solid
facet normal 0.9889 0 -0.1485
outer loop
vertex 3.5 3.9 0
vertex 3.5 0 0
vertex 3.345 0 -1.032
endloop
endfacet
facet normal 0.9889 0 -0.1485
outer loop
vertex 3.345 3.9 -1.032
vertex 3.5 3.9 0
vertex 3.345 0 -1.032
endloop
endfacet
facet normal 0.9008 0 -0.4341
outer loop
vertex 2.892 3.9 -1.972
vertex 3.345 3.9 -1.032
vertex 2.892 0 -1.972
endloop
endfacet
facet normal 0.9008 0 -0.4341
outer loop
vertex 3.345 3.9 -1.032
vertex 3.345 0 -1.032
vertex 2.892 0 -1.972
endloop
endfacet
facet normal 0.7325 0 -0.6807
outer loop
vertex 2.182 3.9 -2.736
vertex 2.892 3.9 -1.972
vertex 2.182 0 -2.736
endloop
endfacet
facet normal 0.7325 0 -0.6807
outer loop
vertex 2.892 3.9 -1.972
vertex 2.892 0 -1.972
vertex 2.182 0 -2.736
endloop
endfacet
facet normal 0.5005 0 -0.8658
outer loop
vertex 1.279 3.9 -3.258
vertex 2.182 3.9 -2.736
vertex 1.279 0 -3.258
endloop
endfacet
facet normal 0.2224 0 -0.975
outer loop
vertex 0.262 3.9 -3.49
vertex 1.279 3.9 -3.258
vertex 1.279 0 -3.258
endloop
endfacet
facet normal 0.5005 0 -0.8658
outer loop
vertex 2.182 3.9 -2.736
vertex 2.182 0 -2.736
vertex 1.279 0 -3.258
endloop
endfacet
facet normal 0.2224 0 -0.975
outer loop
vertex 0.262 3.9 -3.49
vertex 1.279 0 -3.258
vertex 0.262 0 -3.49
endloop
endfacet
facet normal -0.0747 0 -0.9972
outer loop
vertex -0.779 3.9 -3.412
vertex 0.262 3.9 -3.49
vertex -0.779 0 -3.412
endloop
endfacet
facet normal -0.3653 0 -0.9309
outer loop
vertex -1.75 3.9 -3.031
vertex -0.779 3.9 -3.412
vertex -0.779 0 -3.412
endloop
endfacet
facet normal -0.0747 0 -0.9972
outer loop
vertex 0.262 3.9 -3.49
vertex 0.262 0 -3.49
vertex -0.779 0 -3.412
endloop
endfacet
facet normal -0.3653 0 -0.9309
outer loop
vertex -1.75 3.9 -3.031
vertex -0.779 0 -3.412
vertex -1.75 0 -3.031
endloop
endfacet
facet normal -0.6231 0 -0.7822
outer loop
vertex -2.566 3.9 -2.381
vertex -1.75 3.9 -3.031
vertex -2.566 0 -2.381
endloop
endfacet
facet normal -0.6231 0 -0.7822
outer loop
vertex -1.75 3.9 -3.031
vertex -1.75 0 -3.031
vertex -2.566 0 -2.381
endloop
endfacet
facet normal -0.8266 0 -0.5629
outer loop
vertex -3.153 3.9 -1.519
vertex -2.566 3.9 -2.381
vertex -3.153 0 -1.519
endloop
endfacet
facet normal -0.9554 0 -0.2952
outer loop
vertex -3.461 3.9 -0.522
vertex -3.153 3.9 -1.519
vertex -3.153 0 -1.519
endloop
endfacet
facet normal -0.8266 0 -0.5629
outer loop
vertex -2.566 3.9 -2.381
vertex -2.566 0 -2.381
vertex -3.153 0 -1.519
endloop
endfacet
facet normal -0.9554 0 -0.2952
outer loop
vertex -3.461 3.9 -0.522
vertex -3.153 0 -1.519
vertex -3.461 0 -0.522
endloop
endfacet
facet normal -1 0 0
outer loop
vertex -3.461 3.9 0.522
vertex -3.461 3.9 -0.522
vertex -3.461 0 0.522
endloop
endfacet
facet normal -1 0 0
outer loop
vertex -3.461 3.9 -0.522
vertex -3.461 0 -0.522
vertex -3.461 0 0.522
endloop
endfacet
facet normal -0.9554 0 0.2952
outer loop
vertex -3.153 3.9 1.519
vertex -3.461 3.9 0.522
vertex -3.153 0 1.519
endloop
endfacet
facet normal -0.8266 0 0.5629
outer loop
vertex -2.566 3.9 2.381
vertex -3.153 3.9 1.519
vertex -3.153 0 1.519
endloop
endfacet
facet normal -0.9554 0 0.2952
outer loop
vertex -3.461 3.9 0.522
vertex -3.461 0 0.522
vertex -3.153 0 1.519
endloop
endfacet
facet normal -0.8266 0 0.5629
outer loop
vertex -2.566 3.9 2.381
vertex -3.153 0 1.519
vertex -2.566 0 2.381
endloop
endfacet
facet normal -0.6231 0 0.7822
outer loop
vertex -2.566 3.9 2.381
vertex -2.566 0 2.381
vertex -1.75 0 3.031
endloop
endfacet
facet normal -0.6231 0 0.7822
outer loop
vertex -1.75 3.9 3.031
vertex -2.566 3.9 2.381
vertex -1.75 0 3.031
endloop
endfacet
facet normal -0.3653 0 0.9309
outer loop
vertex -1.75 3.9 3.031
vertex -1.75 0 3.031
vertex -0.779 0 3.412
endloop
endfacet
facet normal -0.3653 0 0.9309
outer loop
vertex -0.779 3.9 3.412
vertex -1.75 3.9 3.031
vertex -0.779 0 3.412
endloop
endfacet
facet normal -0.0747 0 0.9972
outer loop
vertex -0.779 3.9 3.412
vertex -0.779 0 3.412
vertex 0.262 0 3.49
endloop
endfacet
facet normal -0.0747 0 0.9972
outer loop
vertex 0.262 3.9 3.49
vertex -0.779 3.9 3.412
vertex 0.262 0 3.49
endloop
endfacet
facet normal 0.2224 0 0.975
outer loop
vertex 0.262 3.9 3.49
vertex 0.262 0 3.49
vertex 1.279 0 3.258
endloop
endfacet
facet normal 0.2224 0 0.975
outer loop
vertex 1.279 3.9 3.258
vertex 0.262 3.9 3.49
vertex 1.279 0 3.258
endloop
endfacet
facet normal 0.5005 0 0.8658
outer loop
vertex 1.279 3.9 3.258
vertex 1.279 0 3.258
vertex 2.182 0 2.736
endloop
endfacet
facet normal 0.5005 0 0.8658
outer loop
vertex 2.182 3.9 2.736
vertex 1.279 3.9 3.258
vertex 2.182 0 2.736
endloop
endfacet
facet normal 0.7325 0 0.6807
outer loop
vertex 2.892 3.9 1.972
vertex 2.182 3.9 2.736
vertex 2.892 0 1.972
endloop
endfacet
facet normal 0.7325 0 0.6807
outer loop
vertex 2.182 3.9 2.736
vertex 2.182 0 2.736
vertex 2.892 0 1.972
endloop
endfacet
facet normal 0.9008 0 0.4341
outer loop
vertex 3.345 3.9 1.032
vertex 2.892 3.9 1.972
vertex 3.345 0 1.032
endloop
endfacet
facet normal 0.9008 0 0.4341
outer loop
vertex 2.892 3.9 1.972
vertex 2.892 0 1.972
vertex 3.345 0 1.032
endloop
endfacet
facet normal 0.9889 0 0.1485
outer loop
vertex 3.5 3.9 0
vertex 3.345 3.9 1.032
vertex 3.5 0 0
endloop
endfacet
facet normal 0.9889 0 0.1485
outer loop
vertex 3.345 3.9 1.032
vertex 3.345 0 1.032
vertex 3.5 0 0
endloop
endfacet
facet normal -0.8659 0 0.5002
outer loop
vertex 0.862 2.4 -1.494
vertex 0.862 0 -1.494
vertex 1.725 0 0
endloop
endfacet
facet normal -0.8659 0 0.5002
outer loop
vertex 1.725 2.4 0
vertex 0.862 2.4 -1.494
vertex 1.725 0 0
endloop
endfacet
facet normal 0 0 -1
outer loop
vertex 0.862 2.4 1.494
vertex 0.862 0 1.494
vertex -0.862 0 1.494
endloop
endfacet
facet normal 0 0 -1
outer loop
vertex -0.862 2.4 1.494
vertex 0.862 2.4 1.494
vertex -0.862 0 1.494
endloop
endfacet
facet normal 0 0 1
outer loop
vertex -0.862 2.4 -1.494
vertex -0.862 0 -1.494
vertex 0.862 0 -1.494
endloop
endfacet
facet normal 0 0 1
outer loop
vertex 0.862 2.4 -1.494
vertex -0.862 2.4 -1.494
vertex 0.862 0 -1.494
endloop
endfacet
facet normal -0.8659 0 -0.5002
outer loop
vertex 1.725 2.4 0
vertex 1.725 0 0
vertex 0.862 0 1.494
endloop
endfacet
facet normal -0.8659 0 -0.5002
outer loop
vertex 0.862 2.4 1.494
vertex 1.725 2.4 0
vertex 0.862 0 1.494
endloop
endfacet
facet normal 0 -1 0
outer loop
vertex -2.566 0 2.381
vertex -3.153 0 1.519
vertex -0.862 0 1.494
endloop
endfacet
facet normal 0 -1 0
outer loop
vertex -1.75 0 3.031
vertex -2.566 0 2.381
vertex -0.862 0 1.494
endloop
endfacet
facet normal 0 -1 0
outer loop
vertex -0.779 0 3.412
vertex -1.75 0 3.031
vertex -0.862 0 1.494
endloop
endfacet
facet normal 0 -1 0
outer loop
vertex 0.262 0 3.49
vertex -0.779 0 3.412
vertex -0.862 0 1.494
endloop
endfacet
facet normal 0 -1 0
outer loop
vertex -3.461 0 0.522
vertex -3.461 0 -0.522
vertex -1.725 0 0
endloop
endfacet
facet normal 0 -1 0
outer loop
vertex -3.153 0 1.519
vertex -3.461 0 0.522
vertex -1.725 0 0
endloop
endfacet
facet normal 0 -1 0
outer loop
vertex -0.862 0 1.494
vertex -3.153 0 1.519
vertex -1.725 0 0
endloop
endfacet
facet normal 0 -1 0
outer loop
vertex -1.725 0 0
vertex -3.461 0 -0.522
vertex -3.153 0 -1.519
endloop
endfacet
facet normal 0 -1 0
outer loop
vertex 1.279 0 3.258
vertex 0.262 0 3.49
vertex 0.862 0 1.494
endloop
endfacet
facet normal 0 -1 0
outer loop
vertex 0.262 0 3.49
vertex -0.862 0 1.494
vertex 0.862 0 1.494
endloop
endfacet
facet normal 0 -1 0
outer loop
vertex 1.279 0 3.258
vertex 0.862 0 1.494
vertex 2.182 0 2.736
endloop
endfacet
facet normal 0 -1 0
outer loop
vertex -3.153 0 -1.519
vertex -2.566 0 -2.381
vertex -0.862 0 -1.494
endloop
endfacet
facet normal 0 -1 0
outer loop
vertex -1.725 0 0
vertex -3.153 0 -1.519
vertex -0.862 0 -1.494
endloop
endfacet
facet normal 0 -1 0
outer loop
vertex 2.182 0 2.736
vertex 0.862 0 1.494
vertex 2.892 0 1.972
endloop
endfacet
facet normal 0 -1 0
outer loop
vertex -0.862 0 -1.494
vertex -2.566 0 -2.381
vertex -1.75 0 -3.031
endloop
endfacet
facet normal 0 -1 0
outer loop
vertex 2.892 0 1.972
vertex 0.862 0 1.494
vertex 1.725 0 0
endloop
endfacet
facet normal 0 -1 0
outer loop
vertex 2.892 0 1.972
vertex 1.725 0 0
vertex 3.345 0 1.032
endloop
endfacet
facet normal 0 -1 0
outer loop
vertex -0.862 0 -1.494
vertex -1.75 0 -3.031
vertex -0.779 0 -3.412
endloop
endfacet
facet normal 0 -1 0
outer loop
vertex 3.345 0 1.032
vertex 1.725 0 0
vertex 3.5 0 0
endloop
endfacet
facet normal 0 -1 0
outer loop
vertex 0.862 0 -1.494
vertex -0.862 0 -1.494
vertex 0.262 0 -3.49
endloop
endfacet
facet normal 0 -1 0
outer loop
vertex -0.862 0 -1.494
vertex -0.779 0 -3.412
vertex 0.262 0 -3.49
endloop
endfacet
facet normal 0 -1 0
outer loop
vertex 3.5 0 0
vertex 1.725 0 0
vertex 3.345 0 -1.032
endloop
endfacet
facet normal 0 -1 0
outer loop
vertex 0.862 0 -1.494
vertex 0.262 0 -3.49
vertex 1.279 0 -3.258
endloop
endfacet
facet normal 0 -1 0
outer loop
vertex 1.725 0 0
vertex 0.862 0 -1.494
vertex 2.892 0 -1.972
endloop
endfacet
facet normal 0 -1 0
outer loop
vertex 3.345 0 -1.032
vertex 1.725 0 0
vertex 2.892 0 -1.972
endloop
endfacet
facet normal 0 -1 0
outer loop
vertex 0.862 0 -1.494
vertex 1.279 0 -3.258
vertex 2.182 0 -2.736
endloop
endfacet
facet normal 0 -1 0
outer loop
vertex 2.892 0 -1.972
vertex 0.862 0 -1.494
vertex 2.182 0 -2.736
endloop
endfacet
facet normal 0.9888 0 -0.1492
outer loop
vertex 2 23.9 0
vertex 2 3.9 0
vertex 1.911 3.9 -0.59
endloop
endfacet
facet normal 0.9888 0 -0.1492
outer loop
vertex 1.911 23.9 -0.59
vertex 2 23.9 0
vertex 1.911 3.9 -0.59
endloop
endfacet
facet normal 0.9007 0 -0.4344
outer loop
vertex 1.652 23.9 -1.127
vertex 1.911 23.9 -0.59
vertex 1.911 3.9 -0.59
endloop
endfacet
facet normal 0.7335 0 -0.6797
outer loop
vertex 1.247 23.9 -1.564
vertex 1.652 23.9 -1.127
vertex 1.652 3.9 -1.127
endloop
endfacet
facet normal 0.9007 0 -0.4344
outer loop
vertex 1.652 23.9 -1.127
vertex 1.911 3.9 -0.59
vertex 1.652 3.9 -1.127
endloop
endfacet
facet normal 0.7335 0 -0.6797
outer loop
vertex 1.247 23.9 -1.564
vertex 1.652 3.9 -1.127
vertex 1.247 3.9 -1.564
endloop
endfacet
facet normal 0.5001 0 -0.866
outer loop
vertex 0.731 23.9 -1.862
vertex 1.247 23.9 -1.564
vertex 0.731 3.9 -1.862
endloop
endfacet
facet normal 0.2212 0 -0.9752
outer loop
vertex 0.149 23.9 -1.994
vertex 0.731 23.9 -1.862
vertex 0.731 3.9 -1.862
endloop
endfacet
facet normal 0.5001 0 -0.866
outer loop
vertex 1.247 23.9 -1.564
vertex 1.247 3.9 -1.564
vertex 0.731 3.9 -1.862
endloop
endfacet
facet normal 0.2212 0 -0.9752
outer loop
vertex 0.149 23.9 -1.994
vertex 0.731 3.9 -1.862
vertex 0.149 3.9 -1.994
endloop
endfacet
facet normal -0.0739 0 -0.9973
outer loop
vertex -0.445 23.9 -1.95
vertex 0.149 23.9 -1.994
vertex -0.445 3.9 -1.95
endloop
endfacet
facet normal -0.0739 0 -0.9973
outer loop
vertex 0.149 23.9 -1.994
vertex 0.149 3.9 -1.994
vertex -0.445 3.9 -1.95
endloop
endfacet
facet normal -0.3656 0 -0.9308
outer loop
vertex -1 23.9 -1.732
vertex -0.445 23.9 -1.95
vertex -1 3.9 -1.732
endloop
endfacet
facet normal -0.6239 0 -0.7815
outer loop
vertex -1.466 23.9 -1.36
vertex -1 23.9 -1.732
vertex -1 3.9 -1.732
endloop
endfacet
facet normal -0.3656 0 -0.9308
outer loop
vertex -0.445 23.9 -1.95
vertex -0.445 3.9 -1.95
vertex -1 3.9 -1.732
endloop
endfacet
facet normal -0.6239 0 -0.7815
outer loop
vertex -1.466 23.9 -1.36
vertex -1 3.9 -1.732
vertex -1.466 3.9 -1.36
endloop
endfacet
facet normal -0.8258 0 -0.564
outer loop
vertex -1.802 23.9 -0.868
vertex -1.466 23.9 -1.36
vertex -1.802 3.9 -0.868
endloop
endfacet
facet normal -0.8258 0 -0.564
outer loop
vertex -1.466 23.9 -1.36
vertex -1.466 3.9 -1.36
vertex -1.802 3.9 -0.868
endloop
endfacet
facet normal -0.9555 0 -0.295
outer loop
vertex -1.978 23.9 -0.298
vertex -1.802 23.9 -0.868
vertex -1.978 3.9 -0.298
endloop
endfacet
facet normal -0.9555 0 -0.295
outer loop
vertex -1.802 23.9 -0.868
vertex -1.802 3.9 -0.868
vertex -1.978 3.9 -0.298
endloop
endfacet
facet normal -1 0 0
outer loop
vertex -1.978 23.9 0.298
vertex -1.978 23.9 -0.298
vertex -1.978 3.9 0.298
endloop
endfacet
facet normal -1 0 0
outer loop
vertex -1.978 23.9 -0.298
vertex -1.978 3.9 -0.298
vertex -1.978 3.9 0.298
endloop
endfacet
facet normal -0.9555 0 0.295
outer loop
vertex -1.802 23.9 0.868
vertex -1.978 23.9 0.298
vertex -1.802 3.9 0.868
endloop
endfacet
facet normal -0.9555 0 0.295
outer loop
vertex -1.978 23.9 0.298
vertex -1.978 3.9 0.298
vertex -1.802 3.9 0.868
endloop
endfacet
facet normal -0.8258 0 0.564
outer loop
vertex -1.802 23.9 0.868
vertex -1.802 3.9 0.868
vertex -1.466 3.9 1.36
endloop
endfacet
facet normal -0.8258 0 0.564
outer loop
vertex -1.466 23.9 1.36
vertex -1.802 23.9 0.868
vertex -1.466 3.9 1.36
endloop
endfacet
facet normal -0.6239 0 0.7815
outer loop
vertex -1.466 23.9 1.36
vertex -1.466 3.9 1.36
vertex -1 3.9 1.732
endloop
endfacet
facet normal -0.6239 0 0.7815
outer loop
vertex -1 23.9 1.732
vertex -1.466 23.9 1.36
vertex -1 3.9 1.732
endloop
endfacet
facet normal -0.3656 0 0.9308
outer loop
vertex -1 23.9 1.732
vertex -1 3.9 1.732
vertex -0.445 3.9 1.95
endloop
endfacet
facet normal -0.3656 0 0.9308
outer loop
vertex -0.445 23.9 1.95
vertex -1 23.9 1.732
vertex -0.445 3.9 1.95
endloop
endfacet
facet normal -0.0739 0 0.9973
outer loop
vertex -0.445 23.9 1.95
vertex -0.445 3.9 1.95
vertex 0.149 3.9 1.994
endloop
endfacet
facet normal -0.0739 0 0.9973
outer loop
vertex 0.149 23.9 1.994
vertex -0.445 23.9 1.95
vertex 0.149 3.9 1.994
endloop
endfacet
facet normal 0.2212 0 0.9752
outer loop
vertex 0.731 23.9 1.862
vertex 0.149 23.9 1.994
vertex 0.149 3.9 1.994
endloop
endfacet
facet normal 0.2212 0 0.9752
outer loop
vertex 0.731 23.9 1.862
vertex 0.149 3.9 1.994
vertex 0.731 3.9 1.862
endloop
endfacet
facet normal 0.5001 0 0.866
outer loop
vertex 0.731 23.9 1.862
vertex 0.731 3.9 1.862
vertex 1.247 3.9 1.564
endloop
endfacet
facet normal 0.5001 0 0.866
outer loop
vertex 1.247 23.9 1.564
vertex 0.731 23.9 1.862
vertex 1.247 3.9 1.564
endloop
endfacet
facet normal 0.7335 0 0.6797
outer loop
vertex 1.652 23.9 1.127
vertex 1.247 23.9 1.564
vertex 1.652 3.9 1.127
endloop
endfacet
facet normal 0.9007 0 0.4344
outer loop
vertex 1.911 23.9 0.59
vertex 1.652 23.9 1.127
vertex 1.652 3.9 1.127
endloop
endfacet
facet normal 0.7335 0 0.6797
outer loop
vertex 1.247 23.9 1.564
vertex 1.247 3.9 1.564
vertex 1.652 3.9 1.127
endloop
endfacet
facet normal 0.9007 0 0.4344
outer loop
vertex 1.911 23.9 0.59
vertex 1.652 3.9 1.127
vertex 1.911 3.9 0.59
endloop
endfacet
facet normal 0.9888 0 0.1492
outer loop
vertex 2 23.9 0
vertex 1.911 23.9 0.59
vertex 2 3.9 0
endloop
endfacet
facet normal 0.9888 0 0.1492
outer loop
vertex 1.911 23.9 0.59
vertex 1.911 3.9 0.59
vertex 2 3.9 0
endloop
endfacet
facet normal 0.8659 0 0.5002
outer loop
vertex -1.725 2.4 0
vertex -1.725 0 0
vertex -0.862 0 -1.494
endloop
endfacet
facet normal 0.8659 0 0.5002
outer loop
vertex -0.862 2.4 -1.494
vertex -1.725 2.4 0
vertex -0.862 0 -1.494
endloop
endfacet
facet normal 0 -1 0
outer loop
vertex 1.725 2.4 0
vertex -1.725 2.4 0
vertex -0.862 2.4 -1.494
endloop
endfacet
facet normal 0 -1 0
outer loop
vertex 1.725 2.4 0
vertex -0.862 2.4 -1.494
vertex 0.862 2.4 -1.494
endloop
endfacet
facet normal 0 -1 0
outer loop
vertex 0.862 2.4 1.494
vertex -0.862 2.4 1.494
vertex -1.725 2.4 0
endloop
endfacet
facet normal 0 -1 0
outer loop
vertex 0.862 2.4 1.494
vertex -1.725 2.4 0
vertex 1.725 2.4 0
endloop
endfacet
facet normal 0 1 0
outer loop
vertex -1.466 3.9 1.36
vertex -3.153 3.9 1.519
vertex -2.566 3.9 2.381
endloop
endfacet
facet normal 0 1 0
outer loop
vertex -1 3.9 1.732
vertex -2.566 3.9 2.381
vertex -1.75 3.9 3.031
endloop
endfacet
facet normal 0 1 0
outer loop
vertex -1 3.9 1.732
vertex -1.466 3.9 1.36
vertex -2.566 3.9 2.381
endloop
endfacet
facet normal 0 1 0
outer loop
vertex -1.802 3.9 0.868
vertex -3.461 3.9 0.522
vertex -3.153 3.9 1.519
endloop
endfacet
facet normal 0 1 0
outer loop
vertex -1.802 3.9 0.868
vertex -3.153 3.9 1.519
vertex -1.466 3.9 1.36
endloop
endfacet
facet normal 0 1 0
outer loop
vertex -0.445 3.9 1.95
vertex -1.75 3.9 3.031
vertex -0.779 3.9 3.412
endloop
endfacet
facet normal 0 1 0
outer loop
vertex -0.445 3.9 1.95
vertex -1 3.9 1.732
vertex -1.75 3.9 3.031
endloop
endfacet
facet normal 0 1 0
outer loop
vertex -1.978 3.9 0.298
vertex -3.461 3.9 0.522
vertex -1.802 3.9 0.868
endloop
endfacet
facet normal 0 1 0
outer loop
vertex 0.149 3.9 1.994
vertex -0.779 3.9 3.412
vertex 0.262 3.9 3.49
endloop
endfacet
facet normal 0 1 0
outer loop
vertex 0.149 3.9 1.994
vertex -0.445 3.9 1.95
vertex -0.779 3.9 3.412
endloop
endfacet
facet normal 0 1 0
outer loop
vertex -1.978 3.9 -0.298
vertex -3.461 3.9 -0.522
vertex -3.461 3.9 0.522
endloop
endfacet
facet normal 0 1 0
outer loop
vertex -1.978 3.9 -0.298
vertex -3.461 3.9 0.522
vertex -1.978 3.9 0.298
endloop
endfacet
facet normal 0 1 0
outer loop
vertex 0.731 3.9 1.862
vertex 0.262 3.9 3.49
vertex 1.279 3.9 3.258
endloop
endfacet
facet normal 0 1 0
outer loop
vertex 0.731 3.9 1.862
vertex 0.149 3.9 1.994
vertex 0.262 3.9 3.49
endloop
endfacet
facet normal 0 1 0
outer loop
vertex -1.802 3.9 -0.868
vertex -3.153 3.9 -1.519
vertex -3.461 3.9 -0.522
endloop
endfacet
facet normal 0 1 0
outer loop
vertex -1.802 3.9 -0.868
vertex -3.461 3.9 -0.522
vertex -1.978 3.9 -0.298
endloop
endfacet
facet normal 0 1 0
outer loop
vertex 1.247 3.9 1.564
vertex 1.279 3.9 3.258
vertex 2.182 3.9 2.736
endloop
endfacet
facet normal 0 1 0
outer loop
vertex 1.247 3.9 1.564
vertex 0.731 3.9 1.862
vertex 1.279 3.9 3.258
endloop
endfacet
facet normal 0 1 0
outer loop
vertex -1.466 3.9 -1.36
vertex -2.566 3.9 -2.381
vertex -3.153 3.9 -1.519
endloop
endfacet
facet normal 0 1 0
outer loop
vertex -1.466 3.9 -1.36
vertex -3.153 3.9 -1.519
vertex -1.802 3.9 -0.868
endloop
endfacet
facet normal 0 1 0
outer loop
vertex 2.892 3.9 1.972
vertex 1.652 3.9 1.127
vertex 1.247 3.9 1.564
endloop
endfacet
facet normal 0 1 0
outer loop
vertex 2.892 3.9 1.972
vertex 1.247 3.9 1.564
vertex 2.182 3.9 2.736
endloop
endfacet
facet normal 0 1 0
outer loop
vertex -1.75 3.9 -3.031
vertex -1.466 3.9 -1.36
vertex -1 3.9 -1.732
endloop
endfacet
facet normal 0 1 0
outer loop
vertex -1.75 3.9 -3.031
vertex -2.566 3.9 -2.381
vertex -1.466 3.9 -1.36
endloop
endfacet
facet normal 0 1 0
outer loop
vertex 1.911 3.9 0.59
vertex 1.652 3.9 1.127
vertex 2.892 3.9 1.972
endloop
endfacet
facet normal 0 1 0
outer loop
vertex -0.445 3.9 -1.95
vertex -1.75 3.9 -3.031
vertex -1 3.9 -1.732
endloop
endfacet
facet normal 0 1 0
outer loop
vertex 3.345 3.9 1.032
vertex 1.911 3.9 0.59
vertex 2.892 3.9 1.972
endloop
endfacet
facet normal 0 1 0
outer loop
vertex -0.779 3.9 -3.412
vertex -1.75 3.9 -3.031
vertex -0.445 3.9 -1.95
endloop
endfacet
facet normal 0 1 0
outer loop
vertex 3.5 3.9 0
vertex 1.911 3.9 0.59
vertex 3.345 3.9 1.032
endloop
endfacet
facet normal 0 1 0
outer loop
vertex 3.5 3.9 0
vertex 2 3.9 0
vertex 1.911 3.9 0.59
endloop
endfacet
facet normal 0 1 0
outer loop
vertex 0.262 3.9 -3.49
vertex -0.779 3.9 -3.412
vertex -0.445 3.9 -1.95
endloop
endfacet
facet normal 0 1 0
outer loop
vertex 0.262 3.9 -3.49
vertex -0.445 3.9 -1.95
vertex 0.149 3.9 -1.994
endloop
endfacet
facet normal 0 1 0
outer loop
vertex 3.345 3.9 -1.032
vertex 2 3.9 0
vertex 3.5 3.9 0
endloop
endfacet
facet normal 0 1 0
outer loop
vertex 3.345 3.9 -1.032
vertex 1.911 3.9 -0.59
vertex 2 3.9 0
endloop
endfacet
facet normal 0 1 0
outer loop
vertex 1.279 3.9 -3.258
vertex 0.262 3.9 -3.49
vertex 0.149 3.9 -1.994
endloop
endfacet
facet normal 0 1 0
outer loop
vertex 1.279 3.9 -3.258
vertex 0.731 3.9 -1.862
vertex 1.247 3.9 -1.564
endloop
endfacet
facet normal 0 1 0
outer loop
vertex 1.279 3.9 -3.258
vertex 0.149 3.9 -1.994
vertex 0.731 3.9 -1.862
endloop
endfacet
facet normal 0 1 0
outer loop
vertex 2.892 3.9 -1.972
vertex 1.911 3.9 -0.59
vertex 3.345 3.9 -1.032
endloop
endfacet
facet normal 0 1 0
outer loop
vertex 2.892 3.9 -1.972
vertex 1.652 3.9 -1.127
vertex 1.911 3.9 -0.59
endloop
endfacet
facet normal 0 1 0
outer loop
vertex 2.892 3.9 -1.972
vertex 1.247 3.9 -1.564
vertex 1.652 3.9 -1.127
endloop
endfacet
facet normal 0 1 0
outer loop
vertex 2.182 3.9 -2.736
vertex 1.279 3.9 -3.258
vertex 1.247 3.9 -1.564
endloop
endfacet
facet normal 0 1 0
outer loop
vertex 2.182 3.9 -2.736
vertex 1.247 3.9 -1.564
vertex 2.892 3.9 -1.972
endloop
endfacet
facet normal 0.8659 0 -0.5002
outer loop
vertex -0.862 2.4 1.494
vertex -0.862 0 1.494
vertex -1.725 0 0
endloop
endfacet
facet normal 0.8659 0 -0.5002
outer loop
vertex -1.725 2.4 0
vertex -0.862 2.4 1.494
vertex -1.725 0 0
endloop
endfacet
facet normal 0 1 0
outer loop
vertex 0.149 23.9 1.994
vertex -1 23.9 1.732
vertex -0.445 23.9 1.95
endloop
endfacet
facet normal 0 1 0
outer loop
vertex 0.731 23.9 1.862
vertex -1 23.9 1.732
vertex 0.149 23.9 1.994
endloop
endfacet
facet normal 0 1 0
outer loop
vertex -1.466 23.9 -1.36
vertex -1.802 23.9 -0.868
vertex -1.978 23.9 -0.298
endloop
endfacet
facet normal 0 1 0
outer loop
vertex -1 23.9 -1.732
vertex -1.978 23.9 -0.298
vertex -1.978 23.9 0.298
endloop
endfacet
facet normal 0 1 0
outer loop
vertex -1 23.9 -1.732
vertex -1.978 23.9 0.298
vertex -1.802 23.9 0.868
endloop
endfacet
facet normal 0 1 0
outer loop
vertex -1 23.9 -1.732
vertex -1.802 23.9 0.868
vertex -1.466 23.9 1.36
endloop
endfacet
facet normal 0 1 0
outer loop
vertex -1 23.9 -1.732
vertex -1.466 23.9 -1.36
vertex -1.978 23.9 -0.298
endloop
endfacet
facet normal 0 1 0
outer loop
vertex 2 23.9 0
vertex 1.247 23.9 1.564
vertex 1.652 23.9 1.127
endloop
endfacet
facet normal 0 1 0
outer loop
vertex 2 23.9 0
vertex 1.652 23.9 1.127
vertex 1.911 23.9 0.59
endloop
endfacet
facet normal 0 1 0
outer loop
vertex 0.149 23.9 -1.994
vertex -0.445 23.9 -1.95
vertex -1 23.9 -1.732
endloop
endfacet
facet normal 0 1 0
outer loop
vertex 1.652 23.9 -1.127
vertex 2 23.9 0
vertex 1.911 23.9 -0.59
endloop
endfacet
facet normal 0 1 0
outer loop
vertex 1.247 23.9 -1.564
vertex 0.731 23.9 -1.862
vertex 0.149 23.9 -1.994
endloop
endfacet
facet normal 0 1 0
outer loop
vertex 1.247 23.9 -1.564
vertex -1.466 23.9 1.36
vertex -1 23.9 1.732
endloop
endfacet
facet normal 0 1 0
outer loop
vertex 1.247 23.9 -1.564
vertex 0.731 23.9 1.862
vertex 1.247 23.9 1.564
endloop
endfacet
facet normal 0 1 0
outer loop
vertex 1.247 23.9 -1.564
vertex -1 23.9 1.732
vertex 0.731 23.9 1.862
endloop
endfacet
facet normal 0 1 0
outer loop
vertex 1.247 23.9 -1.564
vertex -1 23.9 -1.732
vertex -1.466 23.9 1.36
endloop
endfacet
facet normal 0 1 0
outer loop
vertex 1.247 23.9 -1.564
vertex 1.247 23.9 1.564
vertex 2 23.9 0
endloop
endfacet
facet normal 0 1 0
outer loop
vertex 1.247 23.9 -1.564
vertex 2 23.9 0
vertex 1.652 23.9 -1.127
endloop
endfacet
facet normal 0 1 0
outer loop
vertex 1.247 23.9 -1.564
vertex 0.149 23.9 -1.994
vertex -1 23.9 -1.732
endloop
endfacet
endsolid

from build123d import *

# Parameters (mm, degrees)
SKETCH_1_R          = 3.5
EXTRUDE_1_DEPTH     = 3.9
SKETCH_2_R          = 2
EXTRUDE_2_DEPTH     = 20
CUT_EXTRUDE_1_DEPTH = 2.4


with BuildPart() as part:
    # 草图1 → 凸台-拉伸1 (new body)
    with BuildSketch(Plane(origin=(0, 0, 0), x_dir=(1, 0, 0), z_dir=(0, 1, 0))):
        Circle(SKETCH_1_R)
    extrude(amount=EXTRUDE_1_DEPTH)

    # 草图2 → 凸台-拉伸2 (add)
    with BuildSketch(Plane(origin=(0, 3.9, 0), x_dir=(1, 0, 0), z_dir=(0, 1, 0))):
        Circle(SKETCH_2_R)
    extrude(amount=EXTRUDE_2_DEPTH)

    # 草图3 → 切除-拉伸1 (cut)
    with BuildSketch(Plane.XZ):
        Polygon((1.725, 0), (0.8625, 1.493893822), (-0.8625, 1.493893822), (-1.725, 0), (-0.8625, -1.493893822), (0.8625, -1.493893822), align=None)
    extrude(amount=-CUT_EXTRUDE_1_DEPTH, mode=Mode.SUBTRACT)


solid = part.part
